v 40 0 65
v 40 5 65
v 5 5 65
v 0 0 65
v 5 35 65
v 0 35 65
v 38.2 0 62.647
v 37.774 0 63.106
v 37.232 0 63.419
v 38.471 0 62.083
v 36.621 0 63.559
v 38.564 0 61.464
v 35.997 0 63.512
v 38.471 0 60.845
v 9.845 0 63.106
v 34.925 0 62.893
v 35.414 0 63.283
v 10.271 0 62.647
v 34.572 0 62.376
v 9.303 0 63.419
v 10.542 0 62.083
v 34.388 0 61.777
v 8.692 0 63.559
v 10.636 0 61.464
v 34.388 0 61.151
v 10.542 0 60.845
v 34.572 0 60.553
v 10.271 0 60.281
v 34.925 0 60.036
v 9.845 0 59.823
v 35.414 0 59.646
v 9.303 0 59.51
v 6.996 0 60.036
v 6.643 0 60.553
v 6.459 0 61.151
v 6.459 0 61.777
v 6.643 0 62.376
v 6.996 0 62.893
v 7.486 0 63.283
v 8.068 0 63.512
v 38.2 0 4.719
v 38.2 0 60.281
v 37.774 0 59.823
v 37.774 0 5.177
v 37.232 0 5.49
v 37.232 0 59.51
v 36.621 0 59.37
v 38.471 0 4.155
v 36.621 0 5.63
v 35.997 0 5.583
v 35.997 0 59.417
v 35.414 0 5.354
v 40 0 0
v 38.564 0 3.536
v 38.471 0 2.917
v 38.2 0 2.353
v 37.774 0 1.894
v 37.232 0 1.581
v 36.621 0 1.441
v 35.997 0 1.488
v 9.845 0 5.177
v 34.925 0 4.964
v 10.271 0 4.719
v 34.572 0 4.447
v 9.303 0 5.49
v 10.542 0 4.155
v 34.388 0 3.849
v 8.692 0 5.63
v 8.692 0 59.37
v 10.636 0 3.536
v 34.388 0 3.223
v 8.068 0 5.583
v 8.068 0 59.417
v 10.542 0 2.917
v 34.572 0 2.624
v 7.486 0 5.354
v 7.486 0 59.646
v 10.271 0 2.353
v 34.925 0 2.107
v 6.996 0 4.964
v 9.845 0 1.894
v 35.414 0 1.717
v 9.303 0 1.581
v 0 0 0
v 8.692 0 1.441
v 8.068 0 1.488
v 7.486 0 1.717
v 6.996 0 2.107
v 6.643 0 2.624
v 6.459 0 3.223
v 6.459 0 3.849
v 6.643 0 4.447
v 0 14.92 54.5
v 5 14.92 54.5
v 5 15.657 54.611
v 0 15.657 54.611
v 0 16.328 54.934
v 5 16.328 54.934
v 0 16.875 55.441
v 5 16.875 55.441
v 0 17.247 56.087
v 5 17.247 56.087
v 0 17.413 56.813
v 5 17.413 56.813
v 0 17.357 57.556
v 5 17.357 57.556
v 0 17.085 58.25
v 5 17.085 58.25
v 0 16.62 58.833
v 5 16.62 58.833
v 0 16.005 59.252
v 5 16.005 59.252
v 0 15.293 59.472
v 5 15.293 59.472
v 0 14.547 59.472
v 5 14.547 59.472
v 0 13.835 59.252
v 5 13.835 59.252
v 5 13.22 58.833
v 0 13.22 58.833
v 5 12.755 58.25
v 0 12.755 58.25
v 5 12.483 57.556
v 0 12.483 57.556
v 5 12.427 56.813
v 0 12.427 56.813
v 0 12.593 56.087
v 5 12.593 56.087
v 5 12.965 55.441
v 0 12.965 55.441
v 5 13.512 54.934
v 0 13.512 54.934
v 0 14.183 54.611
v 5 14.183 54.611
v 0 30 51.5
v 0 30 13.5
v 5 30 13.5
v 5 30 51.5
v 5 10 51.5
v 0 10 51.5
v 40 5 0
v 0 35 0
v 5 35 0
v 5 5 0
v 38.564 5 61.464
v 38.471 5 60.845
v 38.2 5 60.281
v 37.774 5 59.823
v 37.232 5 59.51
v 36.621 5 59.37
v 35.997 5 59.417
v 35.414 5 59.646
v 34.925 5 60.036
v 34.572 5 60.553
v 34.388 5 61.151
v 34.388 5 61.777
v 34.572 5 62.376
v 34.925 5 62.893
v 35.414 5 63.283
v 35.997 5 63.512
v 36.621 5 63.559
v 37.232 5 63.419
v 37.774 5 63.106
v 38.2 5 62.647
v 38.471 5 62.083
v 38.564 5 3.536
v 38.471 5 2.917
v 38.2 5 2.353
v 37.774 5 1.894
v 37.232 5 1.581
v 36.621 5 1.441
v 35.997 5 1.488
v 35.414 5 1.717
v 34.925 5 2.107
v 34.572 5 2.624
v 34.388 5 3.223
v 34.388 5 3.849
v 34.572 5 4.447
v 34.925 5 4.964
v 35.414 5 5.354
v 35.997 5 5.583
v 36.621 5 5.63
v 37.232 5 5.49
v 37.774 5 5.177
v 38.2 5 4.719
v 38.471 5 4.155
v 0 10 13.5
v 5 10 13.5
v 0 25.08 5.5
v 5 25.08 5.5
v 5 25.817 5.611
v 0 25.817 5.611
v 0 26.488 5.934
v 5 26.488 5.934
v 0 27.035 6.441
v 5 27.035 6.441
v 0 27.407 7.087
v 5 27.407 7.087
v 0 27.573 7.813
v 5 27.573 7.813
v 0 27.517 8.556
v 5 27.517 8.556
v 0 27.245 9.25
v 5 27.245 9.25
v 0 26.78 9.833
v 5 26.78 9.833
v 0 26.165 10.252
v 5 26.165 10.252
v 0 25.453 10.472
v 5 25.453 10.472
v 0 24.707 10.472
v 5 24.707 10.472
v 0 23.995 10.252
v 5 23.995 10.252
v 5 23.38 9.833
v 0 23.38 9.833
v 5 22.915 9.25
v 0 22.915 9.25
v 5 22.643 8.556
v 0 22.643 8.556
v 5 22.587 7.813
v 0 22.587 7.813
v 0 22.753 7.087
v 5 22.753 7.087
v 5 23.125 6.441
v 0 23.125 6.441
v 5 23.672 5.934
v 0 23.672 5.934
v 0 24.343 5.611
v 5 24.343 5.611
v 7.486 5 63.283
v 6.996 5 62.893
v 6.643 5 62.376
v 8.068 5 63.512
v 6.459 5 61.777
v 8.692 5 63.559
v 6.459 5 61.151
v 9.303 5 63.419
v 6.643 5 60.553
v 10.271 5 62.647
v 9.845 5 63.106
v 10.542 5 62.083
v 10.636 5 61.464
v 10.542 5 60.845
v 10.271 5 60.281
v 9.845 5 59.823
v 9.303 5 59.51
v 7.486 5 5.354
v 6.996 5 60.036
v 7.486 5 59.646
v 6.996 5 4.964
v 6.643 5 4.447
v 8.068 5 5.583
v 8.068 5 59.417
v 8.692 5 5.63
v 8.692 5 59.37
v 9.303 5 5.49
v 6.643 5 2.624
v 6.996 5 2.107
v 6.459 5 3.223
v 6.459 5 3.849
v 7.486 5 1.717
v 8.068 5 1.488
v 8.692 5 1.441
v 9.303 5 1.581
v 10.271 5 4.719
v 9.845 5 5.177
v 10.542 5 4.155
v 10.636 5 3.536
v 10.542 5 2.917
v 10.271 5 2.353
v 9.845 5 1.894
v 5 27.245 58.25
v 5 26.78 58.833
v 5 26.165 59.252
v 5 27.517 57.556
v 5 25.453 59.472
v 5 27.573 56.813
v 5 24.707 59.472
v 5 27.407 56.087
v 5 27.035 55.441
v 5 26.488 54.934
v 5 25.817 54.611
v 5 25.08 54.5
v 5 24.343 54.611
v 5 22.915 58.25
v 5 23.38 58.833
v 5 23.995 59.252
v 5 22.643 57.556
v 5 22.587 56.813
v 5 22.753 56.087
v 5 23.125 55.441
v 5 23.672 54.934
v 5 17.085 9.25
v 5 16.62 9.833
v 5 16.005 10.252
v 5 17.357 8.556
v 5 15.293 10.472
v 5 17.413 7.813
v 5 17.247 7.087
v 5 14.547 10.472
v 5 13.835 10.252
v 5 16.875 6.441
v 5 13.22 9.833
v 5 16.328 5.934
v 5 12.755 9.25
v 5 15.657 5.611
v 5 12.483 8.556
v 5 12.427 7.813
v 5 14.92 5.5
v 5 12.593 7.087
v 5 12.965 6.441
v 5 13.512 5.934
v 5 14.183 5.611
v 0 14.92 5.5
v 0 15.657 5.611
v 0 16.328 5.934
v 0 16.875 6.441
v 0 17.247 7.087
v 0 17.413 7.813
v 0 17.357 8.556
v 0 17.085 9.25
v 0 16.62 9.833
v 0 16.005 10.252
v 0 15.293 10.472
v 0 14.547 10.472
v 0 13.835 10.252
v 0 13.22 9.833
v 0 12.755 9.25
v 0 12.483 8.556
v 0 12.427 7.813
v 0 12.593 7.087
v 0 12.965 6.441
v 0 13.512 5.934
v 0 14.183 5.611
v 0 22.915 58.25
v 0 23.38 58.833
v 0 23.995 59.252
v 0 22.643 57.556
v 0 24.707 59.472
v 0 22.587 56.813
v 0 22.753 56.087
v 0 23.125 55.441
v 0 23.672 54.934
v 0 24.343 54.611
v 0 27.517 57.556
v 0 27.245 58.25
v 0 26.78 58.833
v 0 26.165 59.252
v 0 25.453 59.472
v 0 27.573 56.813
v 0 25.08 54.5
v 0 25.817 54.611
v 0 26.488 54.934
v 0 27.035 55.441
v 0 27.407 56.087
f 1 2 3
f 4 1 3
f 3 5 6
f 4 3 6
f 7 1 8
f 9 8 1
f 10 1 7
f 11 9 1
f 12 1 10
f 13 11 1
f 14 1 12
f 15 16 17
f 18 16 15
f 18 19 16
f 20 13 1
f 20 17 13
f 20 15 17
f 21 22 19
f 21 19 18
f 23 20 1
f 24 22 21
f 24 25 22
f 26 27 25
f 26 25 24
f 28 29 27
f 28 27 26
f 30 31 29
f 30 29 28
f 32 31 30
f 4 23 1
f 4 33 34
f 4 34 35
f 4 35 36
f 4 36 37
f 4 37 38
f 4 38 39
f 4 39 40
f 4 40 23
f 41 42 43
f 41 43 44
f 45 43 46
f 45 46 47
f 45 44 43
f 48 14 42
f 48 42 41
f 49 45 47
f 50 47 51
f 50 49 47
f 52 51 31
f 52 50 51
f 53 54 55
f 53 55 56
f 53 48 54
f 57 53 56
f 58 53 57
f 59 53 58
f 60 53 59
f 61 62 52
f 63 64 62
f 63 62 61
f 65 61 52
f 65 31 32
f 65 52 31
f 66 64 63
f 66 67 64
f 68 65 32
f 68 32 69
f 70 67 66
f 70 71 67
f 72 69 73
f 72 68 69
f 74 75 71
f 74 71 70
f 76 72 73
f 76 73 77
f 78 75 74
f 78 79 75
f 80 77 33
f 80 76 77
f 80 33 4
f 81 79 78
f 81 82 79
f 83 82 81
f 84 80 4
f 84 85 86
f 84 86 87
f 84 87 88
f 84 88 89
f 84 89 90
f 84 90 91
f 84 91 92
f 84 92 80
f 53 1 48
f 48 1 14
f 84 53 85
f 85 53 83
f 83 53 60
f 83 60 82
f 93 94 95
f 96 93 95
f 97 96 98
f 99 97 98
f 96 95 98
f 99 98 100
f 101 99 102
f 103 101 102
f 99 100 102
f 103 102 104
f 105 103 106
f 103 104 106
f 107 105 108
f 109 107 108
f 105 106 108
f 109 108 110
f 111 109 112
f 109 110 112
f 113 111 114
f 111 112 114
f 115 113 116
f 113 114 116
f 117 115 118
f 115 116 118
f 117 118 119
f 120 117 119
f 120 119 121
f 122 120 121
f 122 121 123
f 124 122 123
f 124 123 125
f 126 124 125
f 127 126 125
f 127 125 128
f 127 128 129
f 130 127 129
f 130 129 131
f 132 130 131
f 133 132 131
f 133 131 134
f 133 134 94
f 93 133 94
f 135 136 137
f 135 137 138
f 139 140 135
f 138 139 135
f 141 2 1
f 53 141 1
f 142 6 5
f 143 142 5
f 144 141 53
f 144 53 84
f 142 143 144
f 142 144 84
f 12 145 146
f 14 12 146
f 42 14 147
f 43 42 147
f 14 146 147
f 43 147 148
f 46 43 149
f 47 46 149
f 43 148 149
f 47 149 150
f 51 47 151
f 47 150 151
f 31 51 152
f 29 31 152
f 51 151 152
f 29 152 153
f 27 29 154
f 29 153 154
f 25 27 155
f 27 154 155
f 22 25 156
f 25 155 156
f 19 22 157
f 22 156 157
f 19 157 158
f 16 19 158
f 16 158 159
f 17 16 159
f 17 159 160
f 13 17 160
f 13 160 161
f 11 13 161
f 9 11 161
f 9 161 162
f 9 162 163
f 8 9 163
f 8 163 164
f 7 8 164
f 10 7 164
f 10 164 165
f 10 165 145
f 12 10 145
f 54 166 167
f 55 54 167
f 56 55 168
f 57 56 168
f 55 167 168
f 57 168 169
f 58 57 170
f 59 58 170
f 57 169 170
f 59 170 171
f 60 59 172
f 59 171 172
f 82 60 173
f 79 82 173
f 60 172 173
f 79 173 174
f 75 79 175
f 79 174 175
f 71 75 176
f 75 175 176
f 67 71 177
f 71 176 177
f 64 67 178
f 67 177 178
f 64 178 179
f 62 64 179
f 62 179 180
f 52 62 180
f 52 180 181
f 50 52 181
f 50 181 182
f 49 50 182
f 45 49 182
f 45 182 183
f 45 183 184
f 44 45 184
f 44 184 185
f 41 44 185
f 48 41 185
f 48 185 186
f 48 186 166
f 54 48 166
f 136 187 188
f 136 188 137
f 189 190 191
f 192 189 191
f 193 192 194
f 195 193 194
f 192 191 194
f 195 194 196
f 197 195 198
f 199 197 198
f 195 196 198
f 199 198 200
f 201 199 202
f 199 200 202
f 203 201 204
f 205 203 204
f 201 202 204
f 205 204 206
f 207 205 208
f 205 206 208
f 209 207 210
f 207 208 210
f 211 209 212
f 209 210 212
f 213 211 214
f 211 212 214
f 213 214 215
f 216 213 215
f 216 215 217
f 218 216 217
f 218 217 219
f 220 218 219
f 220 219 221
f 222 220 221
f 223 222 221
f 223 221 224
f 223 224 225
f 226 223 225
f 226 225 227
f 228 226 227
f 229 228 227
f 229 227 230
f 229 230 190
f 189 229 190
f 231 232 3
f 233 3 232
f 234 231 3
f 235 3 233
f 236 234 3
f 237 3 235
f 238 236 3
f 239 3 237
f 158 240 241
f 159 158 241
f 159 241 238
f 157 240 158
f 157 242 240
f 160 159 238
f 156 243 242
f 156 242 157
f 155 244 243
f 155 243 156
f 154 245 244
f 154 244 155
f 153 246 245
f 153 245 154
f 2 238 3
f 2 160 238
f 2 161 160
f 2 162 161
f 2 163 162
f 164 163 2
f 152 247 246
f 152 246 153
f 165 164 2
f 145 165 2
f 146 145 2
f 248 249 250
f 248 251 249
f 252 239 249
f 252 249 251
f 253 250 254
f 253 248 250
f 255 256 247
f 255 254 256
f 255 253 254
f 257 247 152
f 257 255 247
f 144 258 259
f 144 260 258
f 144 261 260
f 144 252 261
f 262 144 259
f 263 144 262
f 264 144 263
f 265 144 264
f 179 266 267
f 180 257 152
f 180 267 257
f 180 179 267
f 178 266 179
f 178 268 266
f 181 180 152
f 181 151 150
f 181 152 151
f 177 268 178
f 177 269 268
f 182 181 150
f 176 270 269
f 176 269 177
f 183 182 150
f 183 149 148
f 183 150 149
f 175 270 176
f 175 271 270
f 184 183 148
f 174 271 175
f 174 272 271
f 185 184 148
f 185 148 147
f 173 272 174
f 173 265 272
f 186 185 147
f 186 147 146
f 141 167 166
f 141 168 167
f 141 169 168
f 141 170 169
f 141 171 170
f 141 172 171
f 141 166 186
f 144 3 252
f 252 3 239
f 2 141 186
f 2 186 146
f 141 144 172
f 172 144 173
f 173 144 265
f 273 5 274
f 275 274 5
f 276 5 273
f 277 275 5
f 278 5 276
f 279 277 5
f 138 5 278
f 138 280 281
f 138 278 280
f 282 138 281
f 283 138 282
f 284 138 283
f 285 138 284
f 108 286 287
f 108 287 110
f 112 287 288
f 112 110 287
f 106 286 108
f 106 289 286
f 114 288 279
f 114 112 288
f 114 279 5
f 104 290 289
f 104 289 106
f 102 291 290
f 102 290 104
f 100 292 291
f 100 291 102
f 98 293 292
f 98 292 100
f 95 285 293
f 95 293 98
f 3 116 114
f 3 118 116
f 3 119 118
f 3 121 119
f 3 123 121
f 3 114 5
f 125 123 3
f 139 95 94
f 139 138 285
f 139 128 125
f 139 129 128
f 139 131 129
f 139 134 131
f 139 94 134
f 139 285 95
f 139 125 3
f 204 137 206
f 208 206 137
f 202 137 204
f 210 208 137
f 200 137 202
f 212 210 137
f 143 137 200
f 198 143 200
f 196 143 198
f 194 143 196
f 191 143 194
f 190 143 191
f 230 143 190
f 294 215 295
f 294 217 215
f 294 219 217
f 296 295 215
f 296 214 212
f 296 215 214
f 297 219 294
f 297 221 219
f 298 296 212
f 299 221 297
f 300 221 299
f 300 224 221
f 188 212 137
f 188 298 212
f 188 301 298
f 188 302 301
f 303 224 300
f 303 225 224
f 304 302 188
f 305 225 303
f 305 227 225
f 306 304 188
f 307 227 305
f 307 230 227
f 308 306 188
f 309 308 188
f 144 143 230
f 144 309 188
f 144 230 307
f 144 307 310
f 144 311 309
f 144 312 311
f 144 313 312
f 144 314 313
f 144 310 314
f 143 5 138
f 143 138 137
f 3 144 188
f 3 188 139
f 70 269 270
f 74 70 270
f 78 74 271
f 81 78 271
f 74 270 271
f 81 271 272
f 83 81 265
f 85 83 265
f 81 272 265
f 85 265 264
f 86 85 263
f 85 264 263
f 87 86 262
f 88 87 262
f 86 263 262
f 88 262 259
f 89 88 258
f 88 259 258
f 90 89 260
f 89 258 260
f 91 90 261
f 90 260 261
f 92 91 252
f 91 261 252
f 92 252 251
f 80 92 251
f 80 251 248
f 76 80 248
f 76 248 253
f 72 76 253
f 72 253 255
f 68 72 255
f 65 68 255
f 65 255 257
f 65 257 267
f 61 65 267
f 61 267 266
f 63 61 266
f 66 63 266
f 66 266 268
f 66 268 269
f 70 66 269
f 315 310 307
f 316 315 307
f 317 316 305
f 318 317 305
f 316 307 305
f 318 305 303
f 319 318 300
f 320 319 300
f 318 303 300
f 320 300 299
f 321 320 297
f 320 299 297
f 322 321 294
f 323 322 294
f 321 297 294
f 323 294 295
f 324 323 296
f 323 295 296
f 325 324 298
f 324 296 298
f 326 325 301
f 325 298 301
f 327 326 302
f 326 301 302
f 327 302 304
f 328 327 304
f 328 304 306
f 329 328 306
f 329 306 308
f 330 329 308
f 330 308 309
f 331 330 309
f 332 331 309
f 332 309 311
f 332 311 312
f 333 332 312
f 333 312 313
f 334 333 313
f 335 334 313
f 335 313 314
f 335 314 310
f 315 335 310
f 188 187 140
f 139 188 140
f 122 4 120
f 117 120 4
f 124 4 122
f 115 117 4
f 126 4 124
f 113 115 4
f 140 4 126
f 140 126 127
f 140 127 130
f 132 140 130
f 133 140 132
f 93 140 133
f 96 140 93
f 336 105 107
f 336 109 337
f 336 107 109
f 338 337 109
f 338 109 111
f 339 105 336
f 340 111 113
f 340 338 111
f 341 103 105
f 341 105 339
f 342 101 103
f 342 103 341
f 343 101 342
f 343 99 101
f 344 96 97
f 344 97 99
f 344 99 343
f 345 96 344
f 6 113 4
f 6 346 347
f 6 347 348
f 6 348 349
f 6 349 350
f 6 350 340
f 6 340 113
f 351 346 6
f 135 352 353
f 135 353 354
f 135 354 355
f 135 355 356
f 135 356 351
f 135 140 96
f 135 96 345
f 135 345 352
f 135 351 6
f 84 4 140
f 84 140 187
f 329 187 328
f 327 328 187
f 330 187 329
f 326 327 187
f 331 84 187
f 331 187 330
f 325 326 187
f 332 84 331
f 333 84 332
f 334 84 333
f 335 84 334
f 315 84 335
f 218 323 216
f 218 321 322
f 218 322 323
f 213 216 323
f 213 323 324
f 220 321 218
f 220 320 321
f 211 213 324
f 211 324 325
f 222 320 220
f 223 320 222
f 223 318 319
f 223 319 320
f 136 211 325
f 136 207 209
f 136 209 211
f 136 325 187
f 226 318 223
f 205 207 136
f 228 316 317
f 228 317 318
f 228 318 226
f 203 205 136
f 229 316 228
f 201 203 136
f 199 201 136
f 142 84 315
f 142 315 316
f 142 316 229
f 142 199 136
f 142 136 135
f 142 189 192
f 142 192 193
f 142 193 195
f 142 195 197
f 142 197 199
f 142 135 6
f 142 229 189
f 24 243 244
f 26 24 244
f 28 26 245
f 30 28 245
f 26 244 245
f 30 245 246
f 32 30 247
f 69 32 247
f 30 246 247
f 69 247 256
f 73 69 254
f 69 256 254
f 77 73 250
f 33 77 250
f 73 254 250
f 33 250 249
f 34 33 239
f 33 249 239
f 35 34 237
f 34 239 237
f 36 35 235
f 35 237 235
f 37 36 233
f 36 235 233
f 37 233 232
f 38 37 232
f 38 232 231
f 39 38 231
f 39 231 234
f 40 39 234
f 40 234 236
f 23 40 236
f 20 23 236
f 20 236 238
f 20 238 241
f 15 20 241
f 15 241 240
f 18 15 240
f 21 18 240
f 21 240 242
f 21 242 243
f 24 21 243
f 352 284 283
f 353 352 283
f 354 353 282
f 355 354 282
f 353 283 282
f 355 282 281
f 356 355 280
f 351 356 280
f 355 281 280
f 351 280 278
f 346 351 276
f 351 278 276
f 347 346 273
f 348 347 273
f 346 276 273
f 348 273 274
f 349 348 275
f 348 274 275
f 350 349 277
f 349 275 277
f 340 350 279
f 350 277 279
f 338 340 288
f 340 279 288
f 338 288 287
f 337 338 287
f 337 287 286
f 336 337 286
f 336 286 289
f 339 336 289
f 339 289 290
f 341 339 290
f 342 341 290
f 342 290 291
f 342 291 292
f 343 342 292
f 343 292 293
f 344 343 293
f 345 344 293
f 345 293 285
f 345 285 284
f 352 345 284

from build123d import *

# Parameters (mm, degrees)
BOSS_EXTRUDE1_DEPTH = 65
SKETCH2_R           = 2.5
CUT_EXTRUDE1_DEPTH  = 10
SKETCH3_W           = 38
SKETCH3_H           = 20
CUT_EXTRUDE2_DEPTH  = 10
SKETCH6_R           = 2.1
CUT_EXTRUDE5_DEPTH  = 6


with BuildPart() as part:
    # Sketch1 → Boss-Extrude1 (new body)
    with BuildSketch(Plane.XY):
        Polygon((0, 0), (0, 35), (5, 35), (5, 5), (40, 5), (40, 0), align=None)
    extrude(amount=BOSS_EXTRUDE1_DEPTH)

    # Sketch2 → Cut-Extrude1 (cut)
    with BuildSketch(Plane(origin=(5, 0, 0), x_dir=(0, 0, -1), z_dir=(1, 0, 0))):
        with Locations((-8, 25.08)):
            Circle(SKETCH2_R)
        with Locations((-8, 14.92)):
            Circle(SKETCH2_R)
        with Locations((-57, 25.08)):
            Circle(SKETCH2_R)
        with Locations((-57, 14.92)):
            Circle(SKETCH2_R)
    extrude(amount=-CUT_EXTRUDE1_DEPTH, mode=Mode.SUBTRACT)

    # Sketch3 → Cut-Extrude2 (cut)
    with BuildSketch(Plane.ZY):
        with Locations((32.5, 20)):
            Rectangle(SKETCH3_W, SKETCH3_H)
    extrude(amount=-CUT_EXTRUDE2_DEPTH, mode=Mode.SUBTRACT)

    # Sketch6 → Cut-Extrude5 (cut, through all)
    with BuildSketch(Plane(origin=(0, 5, 0), x_dir=(1, 0, 0), z_dir=(0, 1, 0))):
        with Locations((36.464466094, -3.535533906)):
            Circle(SKETCH6_R)
        with Locations((8.535533906, -3.535533906)):
            Circle(SKETCH6_R)
        with Locations((36.464466094, -61.464466094)):
            Circle(SKETCH6_R)
        with Locations((8.535533906, -61.464466094)):
            Circle(SKETCH6_R)
    extrude(amount=-CUT_EXTRUDE5_DEPTH, mode=Mode.SUBTRACT)


solid = part.part
